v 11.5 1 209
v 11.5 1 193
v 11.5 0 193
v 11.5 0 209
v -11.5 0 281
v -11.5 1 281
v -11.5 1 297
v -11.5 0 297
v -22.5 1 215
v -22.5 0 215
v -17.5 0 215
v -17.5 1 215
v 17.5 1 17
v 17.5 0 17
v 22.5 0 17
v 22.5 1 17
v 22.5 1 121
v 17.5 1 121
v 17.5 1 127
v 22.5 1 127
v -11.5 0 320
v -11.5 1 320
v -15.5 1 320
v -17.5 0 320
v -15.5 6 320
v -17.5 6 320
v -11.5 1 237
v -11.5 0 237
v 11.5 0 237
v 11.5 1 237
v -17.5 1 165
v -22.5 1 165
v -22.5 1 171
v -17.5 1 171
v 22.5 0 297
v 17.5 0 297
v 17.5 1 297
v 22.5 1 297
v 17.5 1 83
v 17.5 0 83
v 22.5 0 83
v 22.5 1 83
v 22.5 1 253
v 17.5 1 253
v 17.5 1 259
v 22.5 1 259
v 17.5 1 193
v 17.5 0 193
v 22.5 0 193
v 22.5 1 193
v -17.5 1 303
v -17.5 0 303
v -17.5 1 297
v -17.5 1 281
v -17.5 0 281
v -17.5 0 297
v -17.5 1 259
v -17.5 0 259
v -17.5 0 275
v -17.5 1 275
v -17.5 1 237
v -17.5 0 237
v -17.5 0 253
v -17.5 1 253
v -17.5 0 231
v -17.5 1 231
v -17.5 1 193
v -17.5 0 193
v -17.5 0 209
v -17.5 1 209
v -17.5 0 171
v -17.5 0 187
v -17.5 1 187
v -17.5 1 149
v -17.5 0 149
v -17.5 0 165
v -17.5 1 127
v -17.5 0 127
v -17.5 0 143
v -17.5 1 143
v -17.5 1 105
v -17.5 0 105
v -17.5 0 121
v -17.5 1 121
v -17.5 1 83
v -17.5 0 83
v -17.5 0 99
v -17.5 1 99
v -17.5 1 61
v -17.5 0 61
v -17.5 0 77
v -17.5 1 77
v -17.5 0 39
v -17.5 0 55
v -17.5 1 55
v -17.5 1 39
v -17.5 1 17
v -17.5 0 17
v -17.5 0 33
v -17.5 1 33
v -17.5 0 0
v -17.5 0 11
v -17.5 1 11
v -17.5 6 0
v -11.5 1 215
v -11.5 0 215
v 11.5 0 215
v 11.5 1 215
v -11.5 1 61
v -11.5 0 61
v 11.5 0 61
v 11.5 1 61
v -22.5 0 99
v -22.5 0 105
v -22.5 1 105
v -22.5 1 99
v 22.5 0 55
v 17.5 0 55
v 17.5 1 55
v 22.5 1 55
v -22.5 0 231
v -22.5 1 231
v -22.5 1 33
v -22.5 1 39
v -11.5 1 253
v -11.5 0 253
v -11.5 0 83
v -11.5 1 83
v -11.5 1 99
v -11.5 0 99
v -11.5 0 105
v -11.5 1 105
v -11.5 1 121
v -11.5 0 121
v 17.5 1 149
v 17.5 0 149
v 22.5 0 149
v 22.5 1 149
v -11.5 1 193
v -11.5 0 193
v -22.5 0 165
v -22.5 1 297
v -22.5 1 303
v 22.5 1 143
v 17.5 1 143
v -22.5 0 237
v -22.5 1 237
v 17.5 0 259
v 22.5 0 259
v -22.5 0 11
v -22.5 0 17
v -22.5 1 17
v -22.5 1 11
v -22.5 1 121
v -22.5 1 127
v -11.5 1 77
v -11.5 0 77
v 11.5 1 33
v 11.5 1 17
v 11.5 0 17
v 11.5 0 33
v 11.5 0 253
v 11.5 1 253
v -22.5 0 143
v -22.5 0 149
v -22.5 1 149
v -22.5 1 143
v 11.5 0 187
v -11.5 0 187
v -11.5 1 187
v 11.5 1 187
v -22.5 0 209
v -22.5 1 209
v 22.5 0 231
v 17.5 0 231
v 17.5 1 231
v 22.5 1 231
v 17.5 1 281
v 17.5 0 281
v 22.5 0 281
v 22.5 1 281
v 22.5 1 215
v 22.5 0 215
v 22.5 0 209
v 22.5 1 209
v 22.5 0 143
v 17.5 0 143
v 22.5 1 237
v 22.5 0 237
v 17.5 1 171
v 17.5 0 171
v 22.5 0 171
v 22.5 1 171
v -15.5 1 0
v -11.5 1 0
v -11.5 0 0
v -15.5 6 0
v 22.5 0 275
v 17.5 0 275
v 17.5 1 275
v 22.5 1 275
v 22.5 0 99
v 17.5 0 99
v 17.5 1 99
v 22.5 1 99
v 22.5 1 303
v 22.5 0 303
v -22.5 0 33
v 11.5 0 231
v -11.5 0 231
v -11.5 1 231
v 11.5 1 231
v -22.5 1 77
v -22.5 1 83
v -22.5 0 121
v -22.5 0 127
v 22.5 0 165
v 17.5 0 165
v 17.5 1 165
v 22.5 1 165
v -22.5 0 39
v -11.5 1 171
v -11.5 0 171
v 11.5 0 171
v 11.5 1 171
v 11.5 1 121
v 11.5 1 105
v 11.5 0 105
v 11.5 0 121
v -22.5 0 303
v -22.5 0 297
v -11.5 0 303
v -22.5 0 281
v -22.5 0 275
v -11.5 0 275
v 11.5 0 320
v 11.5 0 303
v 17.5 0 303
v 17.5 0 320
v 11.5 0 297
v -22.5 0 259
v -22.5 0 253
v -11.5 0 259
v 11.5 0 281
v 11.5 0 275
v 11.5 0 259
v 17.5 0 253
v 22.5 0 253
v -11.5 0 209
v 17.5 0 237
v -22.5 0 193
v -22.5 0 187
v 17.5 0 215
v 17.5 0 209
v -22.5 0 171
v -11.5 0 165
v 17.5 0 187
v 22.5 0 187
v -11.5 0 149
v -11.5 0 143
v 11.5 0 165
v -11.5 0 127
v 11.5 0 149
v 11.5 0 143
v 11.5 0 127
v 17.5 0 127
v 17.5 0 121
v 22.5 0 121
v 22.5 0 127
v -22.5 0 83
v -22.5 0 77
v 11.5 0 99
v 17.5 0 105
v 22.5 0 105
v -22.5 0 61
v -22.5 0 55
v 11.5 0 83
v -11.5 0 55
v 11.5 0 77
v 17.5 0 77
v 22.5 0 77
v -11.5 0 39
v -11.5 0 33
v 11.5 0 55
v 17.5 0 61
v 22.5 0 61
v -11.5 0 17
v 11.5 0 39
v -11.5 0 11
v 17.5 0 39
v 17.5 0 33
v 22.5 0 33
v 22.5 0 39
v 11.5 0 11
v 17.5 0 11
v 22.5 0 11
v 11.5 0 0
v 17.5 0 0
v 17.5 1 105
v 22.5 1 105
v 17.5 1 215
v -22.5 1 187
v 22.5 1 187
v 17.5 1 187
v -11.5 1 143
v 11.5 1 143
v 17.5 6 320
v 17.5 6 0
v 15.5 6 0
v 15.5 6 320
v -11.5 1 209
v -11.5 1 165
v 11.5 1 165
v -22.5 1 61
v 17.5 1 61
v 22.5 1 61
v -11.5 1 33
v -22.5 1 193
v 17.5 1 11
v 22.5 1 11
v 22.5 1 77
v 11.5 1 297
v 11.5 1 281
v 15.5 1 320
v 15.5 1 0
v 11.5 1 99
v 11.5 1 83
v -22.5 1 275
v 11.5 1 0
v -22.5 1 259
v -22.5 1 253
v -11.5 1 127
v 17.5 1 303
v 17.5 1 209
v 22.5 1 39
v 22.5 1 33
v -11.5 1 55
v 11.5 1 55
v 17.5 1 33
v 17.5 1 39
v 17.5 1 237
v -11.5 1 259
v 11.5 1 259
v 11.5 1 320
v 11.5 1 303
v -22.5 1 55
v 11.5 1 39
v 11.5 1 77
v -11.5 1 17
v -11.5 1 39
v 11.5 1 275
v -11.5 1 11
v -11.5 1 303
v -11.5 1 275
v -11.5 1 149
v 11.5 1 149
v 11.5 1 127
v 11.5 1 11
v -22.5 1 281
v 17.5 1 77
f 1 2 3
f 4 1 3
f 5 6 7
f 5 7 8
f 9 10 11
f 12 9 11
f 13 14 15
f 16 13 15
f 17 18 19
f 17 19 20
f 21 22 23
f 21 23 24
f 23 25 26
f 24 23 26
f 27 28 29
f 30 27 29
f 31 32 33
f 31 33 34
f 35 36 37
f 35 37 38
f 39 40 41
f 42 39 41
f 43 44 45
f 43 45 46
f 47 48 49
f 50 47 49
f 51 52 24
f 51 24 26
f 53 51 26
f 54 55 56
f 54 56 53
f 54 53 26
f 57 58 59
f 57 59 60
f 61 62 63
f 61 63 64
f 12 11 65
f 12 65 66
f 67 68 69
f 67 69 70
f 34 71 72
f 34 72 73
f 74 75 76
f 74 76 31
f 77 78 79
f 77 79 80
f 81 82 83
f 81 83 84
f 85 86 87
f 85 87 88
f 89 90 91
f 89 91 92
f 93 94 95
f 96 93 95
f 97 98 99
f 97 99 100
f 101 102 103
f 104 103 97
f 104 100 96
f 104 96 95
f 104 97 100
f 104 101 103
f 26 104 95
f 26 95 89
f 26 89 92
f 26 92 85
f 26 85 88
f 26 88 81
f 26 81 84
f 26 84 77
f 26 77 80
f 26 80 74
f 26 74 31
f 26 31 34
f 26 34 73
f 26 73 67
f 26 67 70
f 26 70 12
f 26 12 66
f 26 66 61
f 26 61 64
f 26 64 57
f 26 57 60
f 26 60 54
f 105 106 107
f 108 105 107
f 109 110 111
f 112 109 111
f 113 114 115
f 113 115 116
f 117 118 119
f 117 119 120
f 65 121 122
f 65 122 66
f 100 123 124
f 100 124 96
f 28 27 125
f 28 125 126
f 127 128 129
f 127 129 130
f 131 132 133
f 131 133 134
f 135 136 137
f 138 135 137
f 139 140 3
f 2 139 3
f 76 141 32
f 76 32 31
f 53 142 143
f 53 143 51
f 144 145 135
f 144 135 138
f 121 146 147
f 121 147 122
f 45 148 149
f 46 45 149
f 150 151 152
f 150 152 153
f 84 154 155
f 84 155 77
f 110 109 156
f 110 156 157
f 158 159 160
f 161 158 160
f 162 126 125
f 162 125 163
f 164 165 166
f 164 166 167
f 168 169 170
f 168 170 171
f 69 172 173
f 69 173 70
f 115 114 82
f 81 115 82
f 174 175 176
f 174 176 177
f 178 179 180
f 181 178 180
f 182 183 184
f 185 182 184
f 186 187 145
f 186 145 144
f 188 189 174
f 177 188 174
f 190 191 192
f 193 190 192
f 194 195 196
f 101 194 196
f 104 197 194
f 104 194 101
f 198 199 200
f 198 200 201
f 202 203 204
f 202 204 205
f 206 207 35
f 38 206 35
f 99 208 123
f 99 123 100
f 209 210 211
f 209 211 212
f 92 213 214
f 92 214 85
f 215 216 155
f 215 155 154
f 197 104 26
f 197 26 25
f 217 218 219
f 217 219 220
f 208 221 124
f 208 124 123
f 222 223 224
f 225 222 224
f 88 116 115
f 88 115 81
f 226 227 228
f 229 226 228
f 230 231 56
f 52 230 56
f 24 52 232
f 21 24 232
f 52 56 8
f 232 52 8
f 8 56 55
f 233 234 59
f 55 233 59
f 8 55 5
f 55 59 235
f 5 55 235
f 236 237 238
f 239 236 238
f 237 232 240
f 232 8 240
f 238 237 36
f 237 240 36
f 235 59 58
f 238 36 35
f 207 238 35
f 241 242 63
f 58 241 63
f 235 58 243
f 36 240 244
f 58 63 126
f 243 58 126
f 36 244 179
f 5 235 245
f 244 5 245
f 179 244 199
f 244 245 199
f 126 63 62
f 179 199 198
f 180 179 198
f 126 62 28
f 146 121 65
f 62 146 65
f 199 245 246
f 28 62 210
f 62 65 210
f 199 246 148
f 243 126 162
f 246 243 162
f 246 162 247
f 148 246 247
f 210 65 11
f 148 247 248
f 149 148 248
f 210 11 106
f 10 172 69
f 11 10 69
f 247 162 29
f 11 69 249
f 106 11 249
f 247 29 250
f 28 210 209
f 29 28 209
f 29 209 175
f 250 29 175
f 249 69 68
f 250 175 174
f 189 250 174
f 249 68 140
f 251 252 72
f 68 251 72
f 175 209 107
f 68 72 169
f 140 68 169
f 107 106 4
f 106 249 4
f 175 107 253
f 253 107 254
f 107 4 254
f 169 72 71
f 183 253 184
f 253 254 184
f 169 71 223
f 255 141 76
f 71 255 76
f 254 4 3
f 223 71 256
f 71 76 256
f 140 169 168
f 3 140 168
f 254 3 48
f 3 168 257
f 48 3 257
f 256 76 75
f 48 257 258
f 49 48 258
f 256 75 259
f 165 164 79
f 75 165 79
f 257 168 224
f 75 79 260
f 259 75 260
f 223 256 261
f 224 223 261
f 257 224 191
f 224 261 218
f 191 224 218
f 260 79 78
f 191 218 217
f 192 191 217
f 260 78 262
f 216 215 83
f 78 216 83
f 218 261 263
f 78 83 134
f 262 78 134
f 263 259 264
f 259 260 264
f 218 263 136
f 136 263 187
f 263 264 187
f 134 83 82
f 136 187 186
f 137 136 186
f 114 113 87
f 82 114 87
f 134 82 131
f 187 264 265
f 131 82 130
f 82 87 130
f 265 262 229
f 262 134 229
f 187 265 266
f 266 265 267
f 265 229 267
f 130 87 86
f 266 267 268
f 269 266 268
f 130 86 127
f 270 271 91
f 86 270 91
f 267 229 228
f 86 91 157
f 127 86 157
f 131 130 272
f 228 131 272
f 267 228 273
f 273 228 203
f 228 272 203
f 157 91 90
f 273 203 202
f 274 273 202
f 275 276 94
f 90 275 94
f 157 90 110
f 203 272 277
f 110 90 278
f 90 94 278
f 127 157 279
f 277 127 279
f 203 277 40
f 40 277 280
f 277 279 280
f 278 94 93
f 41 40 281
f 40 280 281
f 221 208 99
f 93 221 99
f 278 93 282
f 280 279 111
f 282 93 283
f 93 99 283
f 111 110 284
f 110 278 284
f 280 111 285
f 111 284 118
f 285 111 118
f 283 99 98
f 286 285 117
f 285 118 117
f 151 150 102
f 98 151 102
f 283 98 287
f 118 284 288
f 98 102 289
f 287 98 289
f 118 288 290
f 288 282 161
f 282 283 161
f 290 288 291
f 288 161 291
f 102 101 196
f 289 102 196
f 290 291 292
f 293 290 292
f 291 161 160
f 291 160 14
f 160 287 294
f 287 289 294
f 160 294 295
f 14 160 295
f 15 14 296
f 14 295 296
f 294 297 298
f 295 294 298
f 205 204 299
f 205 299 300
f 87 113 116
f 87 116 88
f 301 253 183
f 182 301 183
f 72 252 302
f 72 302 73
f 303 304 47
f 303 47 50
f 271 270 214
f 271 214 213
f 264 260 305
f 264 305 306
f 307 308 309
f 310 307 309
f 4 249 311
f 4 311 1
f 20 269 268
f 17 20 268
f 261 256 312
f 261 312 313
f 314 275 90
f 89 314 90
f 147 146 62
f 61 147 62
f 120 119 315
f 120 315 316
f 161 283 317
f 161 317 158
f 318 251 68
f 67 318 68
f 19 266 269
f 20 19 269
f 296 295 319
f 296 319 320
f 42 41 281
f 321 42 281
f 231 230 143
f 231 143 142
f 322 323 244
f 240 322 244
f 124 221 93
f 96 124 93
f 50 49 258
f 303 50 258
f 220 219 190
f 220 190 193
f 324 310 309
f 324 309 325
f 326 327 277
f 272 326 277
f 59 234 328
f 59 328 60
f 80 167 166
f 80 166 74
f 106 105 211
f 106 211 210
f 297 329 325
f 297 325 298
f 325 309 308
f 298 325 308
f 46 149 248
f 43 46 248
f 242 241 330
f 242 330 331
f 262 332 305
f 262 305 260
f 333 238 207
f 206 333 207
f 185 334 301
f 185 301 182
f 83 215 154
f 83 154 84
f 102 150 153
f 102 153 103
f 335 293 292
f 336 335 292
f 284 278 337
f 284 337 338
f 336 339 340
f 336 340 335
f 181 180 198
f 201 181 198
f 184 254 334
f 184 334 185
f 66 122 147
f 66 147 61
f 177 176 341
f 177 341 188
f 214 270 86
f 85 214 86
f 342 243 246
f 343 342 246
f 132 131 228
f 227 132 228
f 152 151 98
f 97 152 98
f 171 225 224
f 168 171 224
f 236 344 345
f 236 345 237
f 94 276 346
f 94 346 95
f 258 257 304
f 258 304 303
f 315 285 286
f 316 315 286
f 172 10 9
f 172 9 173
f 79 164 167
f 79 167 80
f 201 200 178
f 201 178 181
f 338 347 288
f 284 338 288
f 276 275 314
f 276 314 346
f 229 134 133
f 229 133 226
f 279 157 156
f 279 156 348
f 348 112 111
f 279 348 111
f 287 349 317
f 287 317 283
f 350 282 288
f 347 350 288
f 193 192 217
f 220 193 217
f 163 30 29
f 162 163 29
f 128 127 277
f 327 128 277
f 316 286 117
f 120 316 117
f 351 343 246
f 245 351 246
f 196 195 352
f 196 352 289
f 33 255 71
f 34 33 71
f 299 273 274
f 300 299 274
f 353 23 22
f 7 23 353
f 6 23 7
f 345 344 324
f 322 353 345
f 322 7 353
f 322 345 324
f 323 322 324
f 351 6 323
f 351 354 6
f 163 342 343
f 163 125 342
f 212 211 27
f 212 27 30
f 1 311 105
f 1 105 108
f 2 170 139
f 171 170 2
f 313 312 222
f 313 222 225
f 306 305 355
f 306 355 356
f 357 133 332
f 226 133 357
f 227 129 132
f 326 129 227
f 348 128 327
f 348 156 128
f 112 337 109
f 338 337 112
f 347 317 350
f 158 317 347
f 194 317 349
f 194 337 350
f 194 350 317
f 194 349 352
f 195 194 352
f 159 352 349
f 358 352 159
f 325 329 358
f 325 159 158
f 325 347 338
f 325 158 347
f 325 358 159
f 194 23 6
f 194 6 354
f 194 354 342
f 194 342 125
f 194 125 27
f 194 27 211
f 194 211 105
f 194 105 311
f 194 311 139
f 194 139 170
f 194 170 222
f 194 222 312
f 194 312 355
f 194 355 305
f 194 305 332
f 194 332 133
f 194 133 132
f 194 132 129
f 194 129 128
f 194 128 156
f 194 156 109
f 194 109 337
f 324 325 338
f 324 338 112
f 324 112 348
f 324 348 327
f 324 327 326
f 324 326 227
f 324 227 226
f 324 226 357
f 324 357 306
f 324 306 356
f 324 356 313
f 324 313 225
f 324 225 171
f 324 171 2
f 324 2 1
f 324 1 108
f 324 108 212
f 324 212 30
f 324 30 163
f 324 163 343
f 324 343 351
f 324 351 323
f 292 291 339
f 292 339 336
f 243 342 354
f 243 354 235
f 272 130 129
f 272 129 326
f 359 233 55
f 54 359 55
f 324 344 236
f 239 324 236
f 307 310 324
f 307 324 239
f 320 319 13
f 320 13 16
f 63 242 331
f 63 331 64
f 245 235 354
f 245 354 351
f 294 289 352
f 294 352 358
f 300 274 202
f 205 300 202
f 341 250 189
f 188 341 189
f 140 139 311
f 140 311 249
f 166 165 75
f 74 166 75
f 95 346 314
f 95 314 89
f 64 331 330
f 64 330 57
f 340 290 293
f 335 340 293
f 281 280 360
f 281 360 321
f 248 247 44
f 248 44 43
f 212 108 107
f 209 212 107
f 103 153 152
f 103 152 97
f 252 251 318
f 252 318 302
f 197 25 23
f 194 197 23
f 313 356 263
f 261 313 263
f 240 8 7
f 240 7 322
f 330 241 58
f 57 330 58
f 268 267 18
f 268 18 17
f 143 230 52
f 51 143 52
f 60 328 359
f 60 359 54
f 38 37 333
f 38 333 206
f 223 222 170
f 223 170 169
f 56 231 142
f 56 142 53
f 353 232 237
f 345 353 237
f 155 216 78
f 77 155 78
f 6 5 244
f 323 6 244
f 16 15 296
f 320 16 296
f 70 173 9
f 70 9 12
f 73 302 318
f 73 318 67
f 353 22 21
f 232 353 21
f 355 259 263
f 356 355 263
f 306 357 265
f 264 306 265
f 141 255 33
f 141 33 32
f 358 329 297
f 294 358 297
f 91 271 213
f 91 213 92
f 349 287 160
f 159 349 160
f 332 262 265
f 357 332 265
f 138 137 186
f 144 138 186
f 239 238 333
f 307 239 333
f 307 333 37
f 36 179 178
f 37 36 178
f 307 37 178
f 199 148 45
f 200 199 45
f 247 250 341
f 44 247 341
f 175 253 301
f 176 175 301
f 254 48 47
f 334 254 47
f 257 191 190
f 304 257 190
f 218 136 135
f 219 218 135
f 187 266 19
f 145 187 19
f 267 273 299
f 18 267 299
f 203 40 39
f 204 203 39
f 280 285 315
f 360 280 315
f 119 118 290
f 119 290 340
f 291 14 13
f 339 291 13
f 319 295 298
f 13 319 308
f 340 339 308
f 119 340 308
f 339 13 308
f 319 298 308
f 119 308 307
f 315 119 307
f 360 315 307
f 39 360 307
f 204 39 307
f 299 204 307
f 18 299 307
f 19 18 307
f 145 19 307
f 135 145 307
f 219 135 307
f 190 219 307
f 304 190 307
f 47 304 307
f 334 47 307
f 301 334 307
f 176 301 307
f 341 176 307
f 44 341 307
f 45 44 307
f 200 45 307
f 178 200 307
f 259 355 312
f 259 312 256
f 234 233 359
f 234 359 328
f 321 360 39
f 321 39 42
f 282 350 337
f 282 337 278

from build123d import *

# Parameters (mm, degrees)
BOSS_EXTRUDE1_DEPTH   = 320
BOSS_EXTRUDE1_2_DEPTH = 320
SKETCH3_W             = 45
SKETCH3_H             = 6
BOSS_EXTRUDE2_DEPTH   = 1


with BuildPart() as part:
    # Sketch1 → Boss-Extrude1 (new body)
    with BuildSketch(Plane.XY):
        Polygon((-17.5, 0), (-17.5, 6), (-15.5, 6), (-15.5, 1), (-11.5, 1), (-11.5, 0), align=None)
    extrude(amount=BOSS_EXTRUDE1_DEPTH)



with BuildPart() as body_2:
    # Sketch1 → Boss-Extrude1 2 (new body)
    with BuildSketch(Plane.XY):
        Polygon((17.5, 0), (17.5, 6), (15.5, 6), (15.5, 1), (11.5, 1), (11.5, 0), align=None)
    extrude(amount=BOSS_EXTRUDE1_2_DEPTH)


with BuildPart() as part_1:
    add(part.part)

    add(body_2.part)  # Boss-Extrude2 merges body 2
    # Sketch3 → Boss-Extrude2 (add)
    with BuildSketch(Plane(origin=(0, 0, 0), x_dir=(1, 0, 0), z_dir=(0, 1, 0))):
        with Locations((0, -14)):
            Rectangle(SKETCH3_W, SKETCH3_H)
        with Locations((0, -36)):
            Rectangle(SKETCH3_W, SKETCH3_H)
        with Locations((0, -58)):
            Rectangle(SKETCH3_W, SKETCH3_H)
        with Locations((0, -80)):
            Rectangle(SKETCH3_W, SKETCH3_H)
        with Locations((0, -102)):
            Rectangle(SKETCH3_W, SKETCH3_H)
        with Locations((0, -124)):
            Rectangle(SKETCH3_W, SKETCH3_H)
        with Locations((0, -146)):
            Rectangle(SKETCH3_W, SKETCH3_H)
        with Locations((0, -168)):
            Rectangle(SKETCH3_W, SKETCH3_H)
        with Locations((0, -190)):
            Rectangle(SKETCH3_W, SKETCH3_H)
        with Locations((0, -212)):
            Rectangle(SKETCH3_W, SKETCH3_H)
        with Locations((0, -234)):
            Rectangle(SKETCH3_W, SKETCH3_H)
        with Locations((0, -256)):
            Rectangle(SKETCH3_W, SKETCH3_H)
        with Locations((0, -278)):
            Rectangle(SKETCH3_W, SKETCH3_H)
        with Locations((0, -300)):
            Rectangle(SKETCH3_W, SKETCH3_H)
    extrude(amount=BOSS_EXTRUDE2_DEPTH)


solid = part_1.part
